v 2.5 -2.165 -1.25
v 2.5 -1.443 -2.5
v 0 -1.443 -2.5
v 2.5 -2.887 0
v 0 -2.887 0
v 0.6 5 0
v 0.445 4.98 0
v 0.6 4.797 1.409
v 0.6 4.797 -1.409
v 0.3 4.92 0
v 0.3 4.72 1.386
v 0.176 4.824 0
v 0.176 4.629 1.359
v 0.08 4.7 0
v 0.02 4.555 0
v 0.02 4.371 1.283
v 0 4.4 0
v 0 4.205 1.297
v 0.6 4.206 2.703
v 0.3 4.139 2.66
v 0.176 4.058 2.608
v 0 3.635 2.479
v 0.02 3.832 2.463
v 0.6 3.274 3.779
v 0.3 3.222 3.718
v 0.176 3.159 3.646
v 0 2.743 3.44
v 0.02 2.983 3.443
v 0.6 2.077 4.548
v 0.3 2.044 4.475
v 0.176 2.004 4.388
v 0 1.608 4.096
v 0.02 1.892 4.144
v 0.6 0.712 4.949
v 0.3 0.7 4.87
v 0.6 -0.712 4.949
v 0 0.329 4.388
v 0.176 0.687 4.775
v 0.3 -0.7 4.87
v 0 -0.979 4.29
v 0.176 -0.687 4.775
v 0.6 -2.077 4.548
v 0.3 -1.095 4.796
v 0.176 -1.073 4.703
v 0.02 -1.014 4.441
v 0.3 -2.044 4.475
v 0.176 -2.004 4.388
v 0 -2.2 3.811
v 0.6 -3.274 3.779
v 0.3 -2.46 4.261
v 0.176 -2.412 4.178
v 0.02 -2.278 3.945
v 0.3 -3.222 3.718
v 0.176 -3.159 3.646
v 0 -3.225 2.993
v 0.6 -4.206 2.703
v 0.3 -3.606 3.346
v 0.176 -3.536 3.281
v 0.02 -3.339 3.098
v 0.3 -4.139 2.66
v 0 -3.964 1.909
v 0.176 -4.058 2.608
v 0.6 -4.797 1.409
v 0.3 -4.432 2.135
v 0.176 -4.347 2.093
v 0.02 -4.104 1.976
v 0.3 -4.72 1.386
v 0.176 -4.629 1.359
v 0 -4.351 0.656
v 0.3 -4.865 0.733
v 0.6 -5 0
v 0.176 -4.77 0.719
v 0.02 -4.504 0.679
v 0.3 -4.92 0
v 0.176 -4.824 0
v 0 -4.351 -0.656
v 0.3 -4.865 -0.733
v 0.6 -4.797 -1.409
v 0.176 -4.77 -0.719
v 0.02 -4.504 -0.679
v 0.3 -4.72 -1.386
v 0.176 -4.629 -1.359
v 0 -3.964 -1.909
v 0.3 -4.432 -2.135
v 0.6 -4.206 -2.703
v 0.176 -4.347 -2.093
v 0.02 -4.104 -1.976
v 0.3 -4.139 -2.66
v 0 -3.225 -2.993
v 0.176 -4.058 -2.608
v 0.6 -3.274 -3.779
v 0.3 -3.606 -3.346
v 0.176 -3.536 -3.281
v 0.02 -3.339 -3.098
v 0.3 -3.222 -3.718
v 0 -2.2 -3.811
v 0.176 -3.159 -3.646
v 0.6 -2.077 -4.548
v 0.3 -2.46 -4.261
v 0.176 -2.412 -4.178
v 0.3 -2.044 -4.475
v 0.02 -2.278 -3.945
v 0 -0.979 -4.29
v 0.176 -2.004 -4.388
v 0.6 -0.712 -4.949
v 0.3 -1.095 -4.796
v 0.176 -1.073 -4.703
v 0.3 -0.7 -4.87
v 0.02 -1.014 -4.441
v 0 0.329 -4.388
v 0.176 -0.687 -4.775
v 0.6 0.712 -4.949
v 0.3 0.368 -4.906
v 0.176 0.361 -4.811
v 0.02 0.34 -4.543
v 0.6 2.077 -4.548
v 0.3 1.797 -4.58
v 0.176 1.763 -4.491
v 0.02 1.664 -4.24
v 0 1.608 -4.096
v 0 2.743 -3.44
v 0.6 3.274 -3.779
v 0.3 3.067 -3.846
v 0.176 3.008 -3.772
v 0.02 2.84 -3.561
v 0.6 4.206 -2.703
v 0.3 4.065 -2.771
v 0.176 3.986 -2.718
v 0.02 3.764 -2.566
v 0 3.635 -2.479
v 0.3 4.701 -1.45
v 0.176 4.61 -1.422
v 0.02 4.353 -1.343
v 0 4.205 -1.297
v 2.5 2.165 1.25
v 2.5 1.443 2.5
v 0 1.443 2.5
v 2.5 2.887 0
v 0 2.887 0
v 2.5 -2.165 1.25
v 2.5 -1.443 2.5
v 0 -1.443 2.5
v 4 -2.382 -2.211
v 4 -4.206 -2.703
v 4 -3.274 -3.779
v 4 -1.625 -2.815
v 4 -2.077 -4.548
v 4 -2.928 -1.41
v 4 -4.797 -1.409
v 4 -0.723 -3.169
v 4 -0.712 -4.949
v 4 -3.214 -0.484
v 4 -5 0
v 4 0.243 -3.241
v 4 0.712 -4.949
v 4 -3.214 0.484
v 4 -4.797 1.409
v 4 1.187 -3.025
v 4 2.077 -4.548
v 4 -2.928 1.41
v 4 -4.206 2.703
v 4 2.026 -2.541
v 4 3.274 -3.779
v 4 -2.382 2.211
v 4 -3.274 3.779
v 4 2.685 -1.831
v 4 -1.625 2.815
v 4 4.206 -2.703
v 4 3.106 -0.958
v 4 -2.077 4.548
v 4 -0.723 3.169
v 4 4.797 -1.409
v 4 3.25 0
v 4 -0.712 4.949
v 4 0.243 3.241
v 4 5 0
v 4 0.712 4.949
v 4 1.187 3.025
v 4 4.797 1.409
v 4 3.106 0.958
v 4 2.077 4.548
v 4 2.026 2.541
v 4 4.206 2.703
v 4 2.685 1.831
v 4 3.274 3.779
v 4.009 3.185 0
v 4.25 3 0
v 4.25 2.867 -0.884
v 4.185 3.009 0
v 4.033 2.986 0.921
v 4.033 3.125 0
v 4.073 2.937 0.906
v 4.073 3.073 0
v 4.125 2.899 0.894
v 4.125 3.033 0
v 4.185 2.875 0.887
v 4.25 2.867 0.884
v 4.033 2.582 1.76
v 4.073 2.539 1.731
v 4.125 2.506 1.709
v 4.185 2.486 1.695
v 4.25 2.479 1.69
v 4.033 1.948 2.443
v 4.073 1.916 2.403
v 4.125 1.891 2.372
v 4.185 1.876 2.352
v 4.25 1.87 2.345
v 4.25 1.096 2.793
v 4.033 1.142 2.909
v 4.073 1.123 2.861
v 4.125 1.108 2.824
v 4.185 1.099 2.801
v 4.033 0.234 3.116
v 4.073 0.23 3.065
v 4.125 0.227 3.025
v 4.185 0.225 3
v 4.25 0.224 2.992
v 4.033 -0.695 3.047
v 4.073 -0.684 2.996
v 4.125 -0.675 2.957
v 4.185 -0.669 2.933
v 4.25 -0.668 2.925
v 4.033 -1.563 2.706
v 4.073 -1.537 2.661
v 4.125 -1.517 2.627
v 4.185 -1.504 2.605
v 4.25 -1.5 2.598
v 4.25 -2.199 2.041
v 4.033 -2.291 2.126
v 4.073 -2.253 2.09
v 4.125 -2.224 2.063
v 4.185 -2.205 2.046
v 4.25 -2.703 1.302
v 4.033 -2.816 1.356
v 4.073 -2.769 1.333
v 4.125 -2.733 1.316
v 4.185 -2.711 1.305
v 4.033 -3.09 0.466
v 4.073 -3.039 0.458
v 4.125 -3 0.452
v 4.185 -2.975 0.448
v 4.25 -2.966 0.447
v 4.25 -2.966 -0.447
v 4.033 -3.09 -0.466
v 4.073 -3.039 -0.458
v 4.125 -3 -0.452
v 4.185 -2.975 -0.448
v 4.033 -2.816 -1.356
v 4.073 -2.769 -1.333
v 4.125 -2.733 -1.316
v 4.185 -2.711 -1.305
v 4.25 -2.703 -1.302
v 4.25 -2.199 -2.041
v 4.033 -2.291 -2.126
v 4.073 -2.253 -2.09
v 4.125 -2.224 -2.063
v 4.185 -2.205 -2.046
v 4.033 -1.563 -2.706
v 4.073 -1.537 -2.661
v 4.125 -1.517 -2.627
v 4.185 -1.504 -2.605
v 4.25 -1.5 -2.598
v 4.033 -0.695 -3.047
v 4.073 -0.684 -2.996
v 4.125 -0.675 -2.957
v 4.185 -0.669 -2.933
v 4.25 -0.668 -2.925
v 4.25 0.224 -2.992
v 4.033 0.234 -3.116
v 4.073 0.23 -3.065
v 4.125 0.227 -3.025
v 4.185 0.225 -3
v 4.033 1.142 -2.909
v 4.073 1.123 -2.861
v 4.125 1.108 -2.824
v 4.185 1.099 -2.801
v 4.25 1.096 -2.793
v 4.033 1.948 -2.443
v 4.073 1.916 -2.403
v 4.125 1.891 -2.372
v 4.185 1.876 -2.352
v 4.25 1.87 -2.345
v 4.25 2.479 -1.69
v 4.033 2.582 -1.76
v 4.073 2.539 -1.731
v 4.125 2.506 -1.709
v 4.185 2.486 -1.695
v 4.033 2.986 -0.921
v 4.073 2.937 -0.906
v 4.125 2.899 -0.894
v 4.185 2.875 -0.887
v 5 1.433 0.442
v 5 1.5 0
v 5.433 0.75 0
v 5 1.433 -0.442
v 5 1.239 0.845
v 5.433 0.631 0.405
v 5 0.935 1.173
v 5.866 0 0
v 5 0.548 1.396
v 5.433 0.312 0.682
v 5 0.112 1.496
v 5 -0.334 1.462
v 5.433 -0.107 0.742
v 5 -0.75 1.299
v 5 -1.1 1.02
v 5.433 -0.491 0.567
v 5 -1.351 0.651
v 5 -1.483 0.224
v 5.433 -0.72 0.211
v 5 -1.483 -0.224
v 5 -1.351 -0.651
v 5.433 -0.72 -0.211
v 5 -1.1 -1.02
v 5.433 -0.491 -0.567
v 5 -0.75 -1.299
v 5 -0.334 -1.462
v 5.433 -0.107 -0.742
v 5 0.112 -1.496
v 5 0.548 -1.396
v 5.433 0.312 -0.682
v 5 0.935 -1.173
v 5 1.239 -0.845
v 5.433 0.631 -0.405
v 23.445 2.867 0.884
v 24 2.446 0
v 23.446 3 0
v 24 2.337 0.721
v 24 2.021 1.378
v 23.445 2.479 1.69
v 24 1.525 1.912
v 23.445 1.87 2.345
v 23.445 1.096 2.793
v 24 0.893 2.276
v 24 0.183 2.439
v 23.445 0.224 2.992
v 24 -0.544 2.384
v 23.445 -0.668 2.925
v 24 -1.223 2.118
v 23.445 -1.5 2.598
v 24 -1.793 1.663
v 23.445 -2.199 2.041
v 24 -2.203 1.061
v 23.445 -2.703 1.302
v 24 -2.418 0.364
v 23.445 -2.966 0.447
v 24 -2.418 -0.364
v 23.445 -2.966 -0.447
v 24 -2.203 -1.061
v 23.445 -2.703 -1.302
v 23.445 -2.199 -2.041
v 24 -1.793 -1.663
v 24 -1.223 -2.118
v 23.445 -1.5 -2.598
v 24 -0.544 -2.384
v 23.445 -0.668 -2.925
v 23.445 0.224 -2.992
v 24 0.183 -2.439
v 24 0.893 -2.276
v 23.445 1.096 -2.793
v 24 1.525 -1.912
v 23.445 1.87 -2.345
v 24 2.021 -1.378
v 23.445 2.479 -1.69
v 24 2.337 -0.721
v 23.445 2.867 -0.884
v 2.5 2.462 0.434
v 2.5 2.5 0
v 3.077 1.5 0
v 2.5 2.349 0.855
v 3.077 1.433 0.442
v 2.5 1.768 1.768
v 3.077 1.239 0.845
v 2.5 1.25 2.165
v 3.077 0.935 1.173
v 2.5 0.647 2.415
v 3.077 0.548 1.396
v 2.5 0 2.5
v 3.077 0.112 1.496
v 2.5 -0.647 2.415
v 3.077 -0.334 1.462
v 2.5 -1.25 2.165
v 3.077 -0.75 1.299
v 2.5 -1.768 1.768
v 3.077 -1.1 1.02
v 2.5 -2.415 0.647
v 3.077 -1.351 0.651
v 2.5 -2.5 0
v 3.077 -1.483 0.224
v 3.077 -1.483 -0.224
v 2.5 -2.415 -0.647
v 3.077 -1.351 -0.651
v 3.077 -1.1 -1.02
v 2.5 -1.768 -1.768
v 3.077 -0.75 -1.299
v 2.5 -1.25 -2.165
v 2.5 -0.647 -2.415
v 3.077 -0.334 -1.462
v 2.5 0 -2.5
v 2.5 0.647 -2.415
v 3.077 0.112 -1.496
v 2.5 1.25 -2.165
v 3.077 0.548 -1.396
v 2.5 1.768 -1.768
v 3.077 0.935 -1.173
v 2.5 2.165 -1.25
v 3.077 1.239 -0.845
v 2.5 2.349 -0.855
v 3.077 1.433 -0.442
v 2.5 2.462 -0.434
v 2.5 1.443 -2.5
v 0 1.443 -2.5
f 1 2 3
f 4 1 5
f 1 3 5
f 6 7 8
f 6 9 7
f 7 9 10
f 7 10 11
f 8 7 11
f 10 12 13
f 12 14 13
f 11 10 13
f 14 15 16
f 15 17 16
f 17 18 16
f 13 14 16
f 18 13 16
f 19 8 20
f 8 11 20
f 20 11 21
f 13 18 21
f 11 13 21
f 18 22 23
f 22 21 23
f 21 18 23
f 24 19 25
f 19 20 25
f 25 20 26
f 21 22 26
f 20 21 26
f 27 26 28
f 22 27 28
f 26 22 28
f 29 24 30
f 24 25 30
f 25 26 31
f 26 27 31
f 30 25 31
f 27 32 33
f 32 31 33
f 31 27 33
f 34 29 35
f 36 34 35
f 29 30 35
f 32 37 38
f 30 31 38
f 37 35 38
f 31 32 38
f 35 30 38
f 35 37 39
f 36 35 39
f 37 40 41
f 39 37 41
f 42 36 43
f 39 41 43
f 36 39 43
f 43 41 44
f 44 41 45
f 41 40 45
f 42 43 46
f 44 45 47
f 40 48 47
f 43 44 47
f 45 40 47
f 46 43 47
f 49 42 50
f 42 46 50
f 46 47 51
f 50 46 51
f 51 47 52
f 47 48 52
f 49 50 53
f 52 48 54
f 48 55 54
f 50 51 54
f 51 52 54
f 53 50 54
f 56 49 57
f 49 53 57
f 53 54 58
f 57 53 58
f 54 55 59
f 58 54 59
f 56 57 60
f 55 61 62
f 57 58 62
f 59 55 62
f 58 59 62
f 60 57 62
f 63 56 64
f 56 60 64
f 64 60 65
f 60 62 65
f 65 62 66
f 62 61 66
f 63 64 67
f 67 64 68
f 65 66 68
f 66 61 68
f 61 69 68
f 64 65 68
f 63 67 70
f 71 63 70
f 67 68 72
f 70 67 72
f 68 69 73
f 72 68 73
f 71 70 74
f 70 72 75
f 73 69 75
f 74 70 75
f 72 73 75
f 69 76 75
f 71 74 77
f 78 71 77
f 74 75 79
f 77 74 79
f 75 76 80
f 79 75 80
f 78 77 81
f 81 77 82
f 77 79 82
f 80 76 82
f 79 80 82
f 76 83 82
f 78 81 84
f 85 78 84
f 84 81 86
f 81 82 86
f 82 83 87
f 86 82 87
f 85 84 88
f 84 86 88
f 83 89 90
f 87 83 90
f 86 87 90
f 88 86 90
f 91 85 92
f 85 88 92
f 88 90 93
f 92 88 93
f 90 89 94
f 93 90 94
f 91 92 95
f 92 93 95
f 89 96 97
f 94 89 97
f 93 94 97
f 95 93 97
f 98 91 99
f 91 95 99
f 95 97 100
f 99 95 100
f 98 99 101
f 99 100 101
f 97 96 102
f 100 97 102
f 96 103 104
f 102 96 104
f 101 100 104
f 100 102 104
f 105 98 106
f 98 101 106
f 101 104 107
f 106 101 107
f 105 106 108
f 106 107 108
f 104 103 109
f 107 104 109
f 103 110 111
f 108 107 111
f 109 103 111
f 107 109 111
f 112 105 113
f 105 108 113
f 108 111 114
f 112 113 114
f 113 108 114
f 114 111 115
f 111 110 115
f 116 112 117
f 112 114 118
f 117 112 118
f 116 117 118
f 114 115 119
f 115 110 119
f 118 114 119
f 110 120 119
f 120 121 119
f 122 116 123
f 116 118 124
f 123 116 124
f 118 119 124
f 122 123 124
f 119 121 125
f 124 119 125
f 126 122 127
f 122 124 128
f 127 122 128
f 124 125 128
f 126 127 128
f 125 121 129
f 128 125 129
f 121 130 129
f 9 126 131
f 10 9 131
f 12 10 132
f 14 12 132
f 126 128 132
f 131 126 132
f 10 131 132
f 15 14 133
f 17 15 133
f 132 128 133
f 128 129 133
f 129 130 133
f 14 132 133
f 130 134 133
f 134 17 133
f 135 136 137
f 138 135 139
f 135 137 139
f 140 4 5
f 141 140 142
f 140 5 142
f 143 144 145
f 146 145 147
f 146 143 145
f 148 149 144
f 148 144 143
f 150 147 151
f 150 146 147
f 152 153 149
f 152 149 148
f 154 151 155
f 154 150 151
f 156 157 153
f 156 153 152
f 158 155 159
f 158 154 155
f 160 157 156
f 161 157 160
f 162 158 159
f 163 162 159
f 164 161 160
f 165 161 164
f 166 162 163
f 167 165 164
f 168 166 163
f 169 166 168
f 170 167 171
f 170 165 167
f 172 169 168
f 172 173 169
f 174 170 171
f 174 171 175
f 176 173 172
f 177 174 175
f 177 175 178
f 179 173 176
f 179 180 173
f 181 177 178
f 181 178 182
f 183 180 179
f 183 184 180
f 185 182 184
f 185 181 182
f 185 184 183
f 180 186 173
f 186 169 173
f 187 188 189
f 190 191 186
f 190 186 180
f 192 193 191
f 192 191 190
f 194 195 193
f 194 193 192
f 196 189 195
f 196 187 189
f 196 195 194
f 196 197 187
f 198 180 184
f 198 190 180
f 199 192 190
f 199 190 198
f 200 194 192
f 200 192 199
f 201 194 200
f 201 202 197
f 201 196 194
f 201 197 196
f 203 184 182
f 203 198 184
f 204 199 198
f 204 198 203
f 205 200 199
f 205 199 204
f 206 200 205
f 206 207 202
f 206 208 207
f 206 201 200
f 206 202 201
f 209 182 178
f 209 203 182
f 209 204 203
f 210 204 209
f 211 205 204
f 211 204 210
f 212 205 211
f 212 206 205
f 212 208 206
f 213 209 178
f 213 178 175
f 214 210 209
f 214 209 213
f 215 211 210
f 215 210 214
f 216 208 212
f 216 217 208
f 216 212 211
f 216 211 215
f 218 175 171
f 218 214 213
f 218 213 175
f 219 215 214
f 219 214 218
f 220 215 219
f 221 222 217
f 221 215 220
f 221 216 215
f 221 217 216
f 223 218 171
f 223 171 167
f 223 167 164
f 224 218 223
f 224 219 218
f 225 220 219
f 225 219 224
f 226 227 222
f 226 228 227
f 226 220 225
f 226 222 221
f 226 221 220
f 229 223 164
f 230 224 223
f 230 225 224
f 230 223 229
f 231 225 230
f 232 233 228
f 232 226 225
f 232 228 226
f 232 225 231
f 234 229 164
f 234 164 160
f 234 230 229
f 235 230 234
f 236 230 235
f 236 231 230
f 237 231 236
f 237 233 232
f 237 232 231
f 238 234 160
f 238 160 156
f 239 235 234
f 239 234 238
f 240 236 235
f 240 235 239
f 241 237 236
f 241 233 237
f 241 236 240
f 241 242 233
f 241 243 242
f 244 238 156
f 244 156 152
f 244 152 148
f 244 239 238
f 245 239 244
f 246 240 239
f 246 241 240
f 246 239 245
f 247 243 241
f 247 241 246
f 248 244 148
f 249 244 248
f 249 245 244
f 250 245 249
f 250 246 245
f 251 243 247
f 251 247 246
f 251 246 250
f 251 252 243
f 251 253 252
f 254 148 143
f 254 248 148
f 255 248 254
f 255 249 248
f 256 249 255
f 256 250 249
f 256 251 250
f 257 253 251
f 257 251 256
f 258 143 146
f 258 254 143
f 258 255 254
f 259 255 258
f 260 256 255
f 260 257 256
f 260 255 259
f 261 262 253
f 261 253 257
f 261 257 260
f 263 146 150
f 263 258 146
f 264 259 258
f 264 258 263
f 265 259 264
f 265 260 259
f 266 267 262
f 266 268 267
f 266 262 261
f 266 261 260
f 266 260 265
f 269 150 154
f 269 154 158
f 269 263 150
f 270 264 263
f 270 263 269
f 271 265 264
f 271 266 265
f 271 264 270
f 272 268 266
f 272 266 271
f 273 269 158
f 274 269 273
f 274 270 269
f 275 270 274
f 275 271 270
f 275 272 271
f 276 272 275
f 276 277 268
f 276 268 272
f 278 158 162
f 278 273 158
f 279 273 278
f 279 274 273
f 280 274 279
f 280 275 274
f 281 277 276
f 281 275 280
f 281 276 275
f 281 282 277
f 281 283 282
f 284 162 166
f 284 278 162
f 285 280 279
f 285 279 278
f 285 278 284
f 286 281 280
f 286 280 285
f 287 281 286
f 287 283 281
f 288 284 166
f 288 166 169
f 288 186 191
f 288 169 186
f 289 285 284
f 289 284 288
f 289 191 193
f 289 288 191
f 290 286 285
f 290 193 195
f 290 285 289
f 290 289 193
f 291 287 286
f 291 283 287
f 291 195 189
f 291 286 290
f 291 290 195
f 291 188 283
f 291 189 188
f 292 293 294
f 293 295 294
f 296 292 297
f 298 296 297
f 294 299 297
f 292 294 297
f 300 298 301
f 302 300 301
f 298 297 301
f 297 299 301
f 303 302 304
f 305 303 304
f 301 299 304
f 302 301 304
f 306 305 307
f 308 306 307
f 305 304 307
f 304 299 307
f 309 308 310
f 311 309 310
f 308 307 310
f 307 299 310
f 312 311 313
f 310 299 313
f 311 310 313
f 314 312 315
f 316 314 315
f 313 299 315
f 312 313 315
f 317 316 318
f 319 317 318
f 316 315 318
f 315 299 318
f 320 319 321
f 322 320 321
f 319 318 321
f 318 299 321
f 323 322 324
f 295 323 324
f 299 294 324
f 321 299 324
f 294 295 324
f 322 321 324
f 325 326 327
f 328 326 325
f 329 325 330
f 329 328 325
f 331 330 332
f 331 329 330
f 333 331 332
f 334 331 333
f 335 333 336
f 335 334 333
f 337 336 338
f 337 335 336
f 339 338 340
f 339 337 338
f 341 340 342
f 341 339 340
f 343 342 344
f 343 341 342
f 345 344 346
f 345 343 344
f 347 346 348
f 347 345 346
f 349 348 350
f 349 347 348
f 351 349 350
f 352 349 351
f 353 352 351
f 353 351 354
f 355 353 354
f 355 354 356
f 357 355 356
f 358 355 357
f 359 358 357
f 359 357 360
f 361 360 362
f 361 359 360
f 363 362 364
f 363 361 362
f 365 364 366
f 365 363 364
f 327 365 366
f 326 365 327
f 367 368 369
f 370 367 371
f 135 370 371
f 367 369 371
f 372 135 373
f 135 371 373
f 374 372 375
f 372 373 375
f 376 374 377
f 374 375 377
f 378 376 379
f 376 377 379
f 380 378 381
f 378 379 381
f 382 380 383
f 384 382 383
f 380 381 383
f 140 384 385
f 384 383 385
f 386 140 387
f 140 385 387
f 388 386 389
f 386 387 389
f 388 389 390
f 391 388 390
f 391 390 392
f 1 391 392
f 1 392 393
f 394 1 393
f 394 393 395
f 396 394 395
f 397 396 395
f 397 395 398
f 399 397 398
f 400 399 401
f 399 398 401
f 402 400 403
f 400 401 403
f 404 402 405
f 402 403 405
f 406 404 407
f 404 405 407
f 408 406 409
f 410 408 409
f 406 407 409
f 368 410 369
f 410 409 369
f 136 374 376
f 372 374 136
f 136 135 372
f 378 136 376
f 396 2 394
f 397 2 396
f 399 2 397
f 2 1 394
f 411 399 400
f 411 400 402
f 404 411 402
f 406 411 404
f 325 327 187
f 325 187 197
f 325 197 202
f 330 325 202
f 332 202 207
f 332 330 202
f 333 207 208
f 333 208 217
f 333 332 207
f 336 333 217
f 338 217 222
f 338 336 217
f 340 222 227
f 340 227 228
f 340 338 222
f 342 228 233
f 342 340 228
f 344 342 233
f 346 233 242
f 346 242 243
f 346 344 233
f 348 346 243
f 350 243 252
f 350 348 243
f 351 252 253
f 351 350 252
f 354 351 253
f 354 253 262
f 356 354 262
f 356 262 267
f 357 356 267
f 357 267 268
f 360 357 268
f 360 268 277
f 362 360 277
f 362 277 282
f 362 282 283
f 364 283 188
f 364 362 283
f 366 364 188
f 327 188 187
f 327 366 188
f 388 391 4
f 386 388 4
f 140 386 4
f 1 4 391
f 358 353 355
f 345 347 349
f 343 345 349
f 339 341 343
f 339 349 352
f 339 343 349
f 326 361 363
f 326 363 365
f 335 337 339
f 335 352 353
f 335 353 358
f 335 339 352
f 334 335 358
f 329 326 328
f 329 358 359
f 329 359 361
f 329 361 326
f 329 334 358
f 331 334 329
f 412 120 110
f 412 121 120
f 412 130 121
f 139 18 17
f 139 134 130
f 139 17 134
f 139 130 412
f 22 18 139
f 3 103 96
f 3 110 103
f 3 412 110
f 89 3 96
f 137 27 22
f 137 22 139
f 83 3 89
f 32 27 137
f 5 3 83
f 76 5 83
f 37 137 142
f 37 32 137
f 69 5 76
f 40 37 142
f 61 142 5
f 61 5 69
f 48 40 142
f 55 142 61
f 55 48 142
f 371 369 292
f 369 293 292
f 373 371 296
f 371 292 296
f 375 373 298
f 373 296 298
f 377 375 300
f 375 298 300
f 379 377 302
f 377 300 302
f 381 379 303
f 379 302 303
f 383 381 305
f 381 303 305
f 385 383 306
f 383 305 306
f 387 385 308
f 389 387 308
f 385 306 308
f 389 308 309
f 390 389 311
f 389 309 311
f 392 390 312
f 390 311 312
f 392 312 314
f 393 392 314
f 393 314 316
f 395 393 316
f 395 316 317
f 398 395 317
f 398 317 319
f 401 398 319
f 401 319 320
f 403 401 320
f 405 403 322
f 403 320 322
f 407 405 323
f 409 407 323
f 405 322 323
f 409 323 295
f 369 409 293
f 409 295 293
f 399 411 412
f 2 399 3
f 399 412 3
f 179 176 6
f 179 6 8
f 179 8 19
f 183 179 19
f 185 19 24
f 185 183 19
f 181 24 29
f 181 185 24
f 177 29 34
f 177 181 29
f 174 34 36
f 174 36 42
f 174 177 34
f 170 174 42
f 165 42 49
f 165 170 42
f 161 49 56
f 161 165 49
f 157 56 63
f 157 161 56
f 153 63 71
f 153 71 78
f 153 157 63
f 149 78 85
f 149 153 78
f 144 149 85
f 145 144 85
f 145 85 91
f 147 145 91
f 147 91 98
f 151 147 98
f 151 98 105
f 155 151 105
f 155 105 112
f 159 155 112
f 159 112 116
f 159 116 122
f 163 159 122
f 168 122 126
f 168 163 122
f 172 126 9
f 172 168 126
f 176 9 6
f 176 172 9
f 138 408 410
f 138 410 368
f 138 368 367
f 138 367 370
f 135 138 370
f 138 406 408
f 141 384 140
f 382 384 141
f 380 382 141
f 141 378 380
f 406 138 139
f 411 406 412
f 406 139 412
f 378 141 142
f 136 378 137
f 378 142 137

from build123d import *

# Parameters (mm, degrees)
FILLET1_R   = 0.25
FILLET2_R   = 0.6
HEX_2_DEPTH = 2.5


with BuildPart() as part:
    # BodySke → Base-Revolve (revolve)
    with BuildSketch(Plane.XY):
        Polygon((0, 0), (0, 5), (4, 5), (4, 3), (23.4455, 3), (24, 2.4455), (24, 0), align=None)
    revolve(axis=Axis((-31.75, 0, 0), (1, 0, 0)))

    # Fillet1
    fillet1_edges = [part.edges().sort_by_distance(p)[0] for p in [
        (4, -3, 0),
    ]]
    fillet(fillet1_edges, radius=FILLET1_R)

    # Fillet2
    fillet2_edges = [part.edges().sort_by_distance(p)[0] for p in [
        (0, -5, 0),
    ]]
    fillet(fillet2_edges, radius=FILLET2_R)

    # HexSke → Hex 2 (cut)
    with BuildSketch(Plane(origin=(0, 0, 0), x_dir=(0, 0.5, 0.866025404), z_dir=(-1, 0, 0))):
        Polygon((1.443375673, 2.5), (-1.443375673, 2.5), (-2.886751346, 0), (-1.443375673, -2.5), (1.443375673, -2.5), (2.886751346, 0), align=None)
    extrude(amount=-HEX_2_DEPTH, mode=Mode.SUBTRACT)

    # PilotSke → Hex-PreBroach (revolve, cut)
    with BuildSketch(Plane.XY):
        Polygon((0, 2.5), (2.5, 2.5), (3.077350269, 1.5), (5, 1.5), (5.866025404, 0), (0, 0), align=None)
    revolve(axis=Axis((0, 0, 0), (1, 0, 0)), mode=Mode.SUBTRACT)


solid = part.part
